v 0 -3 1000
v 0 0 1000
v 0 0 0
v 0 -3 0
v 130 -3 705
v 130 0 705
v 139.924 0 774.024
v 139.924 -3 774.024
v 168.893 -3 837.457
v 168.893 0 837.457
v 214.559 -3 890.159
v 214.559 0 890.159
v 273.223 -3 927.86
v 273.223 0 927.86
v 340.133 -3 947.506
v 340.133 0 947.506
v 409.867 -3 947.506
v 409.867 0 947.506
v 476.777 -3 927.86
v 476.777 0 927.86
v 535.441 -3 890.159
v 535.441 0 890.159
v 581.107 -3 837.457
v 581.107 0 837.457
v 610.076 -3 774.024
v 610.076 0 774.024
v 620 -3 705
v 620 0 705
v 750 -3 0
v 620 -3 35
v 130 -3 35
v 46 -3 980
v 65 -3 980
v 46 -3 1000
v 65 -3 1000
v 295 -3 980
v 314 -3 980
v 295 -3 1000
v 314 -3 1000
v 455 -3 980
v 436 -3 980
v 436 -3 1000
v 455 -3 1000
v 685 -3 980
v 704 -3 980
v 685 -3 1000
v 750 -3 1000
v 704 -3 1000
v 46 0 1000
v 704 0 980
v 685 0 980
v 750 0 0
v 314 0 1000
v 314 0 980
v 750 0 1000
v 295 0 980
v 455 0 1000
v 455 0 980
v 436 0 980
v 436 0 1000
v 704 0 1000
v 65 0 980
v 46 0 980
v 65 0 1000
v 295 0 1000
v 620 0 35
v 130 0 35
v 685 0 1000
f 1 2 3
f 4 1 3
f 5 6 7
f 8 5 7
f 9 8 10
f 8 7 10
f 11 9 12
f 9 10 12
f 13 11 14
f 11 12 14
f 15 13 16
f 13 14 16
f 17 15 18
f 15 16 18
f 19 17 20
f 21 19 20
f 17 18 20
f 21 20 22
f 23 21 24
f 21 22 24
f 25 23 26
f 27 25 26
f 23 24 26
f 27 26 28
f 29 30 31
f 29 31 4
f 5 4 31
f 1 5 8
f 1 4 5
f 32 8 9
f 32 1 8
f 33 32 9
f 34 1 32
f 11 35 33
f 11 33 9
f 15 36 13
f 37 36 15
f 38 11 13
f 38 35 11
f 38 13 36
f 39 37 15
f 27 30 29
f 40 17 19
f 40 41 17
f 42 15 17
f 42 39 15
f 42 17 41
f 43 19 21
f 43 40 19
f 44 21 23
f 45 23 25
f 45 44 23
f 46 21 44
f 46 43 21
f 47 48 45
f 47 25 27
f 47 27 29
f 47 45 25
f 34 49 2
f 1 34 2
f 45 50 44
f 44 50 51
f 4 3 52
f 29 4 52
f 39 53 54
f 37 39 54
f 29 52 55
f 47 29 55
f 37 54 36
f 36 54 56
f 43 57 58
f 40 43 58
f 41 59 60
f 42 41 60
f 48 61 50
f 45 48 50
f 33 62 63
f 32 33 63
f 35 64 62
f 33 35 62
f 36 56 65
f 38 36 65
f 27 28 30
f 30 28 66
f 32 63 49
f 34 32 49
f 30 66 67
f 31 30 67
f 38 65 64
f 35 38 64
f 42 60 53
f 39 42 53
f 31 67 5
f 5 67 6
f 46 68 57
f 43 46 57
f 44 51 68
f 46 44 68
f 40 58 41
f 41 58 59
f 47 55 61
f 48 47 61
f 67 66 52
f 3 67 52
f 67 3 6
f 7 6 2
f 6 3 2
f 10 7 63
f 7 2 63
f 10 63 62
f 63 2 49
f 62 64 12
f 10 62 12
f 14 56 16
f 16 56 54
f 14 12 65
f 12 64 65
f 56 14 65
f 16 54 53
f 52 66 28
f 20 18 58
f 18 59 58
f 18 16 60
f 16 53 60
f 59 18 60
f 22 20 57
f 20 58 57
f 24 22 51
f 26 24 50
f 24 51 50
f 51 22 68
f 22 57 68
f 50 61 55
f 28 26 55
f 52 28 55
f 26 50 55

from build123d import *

# Parameters (mm, degrees)
F1_DEPTH = 3


with BuildPart() as f1:
    # F0 (on Front) → F1 (new body)
    with BuildSketch(Plane.XZ):
        Polygon((0, 1000), (0, 0), (750, 0), (750, 1000), (704, 1000), (704, 980), (685, 980), (685, 1000), (455, 1000), (455, 980), (436, 980), (436, 1000), (314, 1000), (314, 980), (295, 980), (295, 1000), (65, 1000), (65, 980), (46, 980), (46, 1000), align=None)
        with BuildLine():
            Line((620, 35), (130, 35))
            Line((130, 35), (130, 705))
            ThreePointArc((130, 705), (375, 950), (620, 705))
            Line((620, 705), (620, 35))
        make_face(mode=Mode.SUBTRACT)
    extrude(amount=F1_DEPTH)


solid = f1.part
